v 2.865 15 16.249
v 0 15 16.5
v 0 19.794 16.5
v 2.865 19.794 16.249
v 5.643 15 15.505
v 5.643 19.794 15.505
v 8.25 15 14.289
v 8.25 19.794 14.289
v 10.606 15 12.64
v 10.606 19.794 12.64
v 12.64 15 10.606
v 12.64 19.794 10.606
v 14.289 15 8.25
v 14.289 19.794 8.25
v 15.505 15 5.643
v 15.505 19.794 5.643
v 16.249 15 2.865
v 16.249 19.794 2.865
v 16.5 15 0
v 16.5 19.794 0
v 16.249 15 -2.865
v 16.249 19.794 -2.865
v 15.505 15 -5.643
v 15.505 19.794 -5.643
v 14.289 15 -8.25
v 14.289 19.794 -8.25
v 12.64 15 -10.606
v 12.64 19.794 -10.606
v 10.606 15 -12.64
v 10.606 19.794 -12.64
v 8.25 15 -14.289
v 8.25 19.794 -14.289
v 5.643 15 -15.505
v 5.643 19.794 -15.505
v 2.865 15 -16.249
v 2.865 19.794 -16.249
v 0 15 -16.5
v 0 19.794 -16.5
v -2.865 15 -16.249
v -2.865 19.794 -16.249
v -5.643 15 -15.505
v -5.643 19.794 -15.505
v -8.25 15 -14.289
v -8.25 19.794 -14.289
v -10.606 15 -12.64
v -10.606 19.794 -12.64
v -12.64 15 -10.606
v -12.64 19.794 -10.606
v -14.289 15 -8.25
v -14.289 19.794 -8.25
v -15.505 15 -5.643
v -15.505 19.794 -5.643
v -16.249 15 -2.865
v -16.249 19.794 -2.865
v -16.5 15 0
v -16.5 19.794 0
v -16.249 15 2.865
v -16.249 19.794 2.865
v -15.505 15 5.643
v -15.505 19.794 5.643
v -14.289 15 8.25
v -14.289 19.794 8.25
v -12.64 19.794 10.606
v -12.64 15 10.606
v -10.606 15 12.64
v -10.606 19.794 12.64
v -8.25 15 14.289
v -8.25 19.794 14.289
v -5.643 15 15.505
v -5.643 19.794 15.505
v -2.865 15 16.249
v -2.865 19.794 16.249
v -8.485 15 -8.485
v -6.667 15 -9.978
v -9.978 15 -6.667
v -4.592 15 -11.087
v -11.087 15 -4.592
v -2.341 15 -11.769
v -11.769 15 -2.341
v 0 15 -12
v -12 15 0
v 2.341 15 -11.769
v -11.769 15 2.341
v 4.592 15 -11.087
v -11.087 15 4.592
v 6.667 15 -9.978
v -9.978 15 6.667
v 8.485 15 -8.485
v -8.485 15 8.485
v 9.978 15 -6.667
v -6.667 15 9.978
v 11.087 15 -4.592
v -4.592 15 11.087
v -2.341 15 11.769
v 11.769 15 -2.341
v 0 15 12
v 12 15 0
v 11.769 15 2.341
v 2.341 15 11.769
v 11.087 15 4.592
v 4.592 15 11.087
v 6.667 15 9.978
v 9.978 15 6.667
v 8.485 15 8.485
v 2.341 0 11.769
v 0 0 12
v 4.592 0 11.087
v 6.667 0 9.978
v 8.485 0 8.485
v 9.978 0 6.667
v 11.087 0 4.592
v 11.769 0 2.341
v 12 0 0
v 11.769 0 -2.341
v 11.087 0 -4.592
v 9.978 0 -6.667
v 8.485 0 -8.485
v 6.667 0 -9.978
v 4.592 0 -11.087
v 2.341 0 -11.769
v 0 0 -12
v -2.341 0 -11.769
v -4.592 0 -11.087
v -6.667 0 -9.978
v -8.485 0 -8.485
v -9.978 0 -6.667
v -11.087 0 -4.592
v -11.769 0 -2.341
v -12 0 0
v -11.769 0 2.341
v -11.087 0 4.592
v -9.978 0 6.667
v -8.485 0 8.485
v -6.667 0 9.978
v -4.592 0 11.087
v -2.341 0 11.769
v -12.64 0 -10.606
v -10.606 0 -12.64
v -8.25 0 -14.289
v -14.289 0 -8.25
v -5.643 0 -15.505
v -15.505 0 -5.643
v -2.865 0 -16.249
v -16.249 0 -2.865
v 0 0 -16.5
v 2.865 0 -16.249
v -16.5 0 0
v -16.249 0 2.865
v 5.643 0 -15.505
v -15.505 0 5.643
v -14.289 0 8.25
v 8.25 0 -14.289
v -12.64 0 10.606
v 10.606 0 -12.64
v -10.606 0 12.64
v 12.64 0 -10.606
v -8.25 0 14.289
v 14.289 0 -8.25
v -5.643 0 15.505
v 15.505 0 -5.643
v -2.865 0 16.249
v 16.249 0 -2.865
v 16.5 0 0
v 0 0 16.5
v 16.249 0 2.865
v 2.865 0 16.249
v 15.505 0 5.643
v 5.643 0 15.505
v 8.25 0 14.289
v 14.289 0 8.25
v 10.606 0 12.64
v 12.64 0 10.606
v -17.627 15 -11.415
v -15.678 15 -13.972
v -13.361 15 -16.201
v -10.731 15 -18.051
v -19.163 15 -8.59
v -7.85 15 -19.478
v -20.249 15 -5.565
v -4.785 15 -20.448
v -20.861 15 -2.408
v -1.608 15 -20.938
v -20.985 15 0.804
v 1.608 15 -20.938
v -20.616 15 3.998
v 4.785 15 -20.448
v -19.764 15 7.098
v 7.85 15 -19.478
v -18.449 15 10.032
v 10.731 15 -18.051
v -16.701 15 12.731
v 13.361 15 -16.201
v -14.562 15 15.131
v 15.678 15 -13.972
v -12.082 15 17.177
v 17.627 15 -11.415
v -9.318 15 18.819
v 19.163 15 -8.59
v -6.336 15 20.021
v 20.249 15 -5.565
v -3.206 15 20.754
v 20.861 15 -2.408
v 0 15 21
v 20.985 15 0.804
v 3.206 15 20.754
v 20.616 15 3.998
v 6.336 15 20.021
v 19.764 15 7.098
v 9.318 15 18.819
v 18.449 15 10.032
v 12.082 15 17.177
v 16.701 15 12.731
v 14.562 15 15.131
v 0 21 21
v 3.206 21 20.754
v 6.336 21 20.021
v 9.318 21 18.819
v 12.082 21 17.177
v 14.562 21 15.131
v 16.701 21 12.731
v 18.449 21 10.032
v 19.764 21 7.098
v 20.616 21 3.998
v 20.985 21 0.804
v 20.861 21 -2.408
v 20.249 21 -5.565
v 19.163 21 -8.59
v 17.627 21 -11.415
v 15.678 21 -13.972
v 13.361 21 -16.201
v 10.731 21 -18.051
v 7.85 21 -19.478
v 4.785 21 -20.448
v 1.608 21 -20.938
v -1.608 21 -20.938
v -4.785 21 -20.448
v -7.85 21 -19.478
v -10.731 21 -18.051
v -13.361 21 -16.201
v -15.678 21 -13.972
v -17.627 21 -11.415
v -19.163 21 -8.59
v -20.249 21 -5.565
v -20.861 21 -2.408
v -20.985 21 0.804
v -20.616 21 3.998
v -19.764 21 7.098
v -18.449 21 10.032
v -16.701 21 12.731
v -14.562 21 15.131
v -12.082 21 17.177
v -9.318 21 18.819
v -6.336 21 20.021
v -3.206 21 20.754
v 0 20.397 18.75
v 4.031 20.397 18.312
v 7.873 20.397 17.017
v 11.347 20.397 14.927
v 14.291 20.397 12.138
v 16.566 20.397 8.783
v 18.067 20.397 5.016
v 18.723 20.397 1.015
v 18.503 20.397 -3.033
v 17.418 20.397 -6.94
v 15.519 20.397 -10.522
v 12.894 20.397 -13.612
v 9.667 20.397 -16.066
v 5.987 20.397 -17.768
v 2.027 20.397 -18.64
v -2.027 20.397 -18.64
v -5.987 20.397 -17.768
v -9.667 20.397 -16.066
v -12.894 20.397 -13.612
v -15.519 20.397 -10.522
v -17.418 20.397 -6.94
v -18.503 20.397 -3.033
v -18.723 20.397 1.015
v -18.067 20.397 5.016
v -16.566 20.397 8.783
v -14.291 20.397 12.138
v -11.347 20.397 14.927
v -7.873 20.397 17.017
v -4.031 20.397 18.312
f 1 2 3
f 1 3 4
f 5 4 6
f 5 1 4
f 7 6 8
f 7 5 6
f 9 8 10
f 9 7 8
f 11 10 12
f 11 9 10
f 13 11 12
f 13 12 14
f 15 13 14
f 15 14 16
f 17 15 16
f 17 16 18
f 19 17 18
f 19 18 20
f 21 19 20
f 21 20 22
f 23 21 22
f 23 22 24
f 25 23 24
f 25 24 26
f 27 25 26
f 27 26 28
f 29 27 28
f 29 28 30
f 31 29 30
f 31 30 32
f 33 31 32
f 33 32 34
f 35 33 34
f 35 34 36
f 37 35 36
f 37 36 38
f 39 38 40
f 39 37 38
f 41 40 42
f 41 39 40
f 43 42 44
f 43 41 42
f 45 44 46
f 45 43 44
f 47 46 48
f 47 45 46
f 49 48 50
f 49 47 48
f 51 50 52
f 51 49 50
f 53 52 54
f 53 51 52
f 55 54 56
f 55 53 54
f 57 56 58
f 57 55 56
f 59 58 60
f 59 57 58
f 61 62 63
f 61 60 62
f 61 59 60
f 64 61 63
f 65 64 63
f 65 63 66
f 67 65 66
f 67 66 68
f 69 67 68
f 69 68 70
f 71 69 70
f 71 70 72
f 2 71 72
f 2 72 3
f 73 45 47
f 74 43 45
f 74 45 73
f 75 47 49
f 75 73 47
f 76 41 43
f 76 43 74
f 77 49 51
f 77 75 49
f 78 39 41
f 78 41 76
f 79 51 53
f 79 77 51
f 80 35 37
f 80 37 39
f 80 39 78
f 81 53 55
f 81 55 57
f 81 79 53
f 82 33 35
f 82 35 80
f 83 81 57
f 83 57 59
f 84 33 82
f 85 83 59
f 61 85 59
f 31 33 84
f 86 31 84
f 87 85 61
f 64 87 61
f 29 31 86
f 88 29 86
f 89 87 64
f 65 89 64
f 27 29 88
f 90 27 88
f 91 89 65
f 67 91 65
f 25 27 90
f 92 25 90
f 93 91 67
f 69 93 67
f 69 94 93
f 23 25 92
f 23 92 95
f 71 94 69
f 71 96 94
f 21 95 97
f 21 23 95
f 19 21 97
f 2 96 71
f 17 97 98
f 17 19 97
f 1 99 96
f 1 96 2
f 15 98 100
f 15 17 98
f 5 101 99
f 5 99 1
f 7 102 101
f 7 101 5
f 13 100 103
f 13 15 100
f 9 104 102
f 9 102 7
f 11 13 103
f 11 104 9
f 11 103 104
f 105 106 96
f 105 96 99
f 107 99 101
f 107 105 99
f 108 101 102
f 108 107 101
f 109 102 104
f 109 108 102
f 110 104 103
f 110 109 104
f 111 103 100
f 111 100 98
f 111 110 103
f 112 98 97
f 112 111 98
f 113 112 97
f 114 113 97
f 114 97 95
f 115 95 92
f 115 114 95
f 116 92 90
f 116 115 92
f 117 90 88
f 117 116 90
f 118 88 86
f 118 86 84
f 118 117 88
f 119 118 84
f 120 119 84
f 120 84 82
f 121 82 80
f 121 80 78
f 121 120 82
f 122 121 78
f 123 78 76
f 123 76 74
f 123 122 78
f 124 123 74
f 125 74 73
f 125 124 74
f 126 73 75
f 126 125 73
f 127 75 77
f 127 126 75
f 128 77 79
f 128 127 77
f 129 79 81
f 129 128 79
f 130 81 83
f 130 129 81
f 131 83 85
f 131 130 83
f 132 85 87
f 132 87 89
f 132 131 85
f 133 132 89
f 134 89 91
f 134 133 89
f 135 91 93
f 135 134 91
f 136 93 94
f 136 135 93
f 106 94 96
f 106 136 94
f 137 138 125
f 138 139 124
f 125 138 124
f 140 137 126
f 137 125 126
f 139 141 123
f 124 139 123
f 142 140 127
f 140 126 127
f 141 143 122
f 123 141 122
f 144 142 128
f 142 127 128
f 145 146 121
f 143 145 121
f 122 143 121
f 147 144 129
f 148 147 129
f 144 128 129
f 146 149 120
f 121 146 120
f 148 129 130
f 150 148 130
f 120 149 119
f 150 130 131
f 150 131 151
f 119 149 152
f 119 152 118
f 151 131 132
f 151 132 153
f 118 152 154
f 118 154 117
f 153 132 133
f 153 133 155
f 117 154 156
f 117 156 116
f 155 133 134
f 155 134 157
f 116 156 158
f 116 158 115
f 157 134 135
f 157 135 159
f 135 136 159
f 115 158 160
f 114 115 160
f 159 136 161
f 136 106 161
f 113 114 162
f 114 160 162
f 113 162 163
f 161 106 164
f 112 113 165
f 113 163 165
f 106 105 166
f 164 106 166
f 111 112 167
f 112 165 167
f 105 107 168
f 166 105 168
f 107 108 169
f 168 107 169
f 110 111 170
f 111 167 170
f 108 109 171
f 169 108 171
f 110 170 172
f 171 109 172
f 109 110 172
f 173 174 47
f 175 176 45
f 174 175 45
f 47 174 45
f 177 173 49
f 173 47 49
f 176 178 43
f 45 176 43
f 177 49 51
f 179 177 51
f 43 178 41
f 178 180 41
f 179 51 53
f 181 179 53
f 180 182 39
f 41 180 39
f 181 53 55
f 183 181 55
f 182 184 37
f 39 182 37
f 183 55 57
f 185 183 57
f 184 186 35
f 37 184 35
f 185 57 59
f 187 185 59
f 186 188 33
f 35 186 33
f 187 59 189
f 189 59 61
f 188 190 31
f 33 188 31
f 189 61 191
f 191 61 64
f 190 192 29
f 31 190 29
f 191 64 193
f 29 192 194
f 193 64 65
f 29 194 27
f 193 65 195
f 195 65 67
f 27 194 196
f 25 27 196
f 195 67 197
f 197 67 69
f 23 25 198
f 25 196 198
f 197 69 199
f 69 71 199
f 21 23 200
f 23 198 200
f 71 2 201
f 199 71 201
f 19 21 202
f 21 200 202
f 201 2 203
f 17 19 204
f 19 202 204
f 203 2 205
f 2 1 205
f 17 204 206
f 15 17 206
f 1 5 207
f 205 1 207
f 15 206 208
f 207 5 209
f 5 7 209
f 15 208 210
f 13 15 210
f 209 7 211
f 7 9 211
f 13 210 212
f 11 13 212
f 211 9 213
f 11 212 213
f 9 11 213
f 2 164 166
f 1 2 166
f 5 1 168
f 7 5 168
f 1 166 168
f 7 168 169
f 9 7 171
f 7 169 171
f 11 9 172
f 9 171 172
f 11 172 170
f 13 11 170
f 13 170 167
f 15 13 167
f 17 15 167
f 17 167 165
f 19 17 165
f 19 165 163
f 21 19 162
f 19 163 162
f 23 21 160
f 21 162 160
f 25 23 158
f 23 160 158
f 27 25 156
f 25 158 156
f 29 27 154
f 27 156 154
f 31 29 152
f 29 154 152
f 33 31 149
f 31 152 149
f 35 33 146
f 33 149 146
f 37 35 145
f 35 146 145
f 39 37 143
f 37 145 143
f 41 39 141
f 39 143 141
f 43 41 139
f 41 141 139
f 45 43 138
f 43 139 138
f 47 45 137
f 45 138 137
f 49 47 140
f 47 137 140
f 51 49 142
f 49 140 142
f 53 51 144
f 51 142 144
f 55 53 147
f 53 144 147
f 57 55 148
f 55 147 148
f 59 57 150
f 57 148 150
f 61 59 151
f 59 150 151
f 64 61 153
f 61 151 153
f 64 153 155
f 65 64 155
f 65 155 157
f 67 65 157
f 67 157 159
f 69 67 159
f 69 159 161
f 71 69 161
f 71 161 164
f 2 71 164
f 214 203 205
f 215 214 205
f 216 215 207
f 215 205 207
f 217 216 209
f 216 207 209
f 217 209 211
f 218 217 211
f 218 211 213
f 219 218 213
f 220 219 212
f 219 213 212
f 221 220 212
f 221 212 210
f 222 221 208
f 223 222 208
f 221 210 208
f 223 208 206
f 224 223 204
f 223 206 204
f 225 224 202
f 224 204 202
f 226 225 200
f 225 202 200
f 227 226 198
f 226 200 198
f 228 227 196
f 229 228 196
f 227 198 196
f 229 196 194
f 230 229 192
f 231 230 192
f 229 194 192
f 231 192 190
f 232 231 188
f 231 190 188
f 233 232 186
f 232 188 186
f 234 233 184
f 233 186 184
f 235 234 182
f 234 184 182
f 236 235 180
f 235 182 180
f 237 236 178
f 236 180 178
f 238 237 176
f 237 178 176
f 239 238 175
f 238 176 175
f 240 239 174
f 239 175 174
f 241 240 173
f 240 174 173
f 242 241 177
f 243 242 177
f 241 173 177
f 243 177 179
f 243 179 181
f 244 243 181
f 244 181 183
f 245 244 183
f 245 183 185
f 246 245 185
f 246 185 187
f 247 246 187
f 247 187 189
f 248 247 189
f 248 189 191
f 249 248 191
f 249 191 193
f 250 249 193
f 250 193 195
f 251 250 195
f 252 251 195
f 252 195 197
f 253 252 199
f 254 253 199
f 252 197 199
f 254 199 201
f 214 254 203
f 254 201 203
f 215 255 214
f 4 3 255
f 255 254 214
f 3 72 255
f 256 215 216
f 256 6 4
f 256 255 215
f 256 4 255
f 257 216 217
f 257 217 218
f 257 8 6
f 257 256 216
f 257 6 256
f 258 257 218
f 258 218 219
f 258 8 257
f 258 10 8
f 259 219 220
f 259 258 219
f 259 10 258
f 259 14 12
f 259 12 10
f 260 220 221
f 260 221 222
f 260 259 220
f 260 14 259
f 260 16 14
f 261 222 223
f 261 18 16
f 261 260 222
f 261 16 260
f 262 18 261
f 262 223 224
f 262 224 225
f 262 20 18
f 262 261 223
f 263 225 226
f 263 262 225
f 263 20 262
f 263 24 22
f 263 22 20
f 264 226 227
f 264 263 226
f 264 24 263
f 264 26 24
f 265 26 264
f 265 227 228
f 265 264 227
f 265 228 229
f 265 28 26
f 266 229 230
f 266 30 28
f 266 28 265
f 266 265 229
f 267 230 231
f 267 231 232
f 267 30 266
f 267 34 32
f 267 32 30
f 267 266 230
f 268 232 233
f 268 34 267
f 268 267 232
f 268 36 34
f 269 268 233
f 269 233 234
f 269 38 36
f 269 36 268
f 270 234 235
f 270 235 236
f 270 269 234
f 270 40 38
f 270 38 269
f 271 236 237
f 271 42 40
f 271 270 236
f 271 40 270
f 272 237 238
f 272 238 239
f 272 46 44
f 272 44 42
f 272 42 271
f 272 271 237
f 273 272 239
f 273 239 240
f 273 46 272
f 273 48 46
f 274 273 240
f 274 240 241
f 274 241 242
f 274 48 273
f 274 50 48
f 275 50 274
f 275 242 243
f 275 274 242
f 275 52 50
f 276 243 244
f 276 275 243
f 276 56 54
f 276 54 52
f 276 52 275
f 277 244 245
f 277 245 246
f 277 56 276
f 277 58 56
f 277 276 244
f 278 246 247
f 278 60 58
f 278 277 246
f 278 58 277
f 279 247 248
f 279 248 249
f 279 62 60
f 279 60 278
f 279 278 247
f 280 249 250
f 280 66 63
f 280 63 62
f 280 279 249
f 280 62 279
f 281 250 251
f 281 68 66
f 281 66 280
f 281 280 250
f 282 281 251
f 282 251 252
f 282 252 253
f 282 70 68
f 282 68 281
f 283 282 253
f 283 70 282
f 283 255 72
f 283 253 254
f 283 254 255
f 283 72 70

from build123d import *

# Parameters (mm, degrees)
SKETCH1_R           = 16.5
SKETCH1_R_2         = 12
BOSS_EXTRUDE1_DEPTH = 15
SKETCH2_R           = 21
SKETCH2_R_2         = 16.5
BOSS_EXTRUDE2_DEPTH = 6


with BuildPart() as part:
    # Sketch1 → Boss-Extrude1 (new body)
    with BuildSketch(Plane(origin=(0, 0, 0), x_dir=(1, 0, 0), z_dir=(0, 1, 0))):
        with Locations(Location((0, 0, 0), (0, 0, 270))):
            Circle(SKETCH1_R)
        with Locations(Location((0, 0, 0), (0, 0, 270))):
            Circle(SKETCH1_R_2, mode=Mode.SUBTRACT)
    extrude(amount=BOSS_EXTRUDE1_DEPTH)


with BuildPart() as body_2:
    # Sketch2 → Boss-Extrude2 (new body)
    with BuildSketch(Plane(origin=(0, 15, 0), x_dir=(1, 0, 0), z_dir=(0, 1, 0))):
        with Locations(Location((0, 0, 0), (0, 0, 270))):
            Circle(SKETCH2_R)
        with Locations(Location((0, 0, 0), (0, 0, 270))):
            Circle(SKETCH2_R_2, mode=Mode.SUBTRACT)
    extrude(amount=BOSS_EXTRUDE2_DEPTH)

    # Sketch3 → Cut-Revolve1 (revolve, cut)
    with BuildSketch(Plane.XY, mode=Mode.PRIVATE) as cut_revolve1_sk:
        Polygon((0, 21), (-21, 21), (0, 15.373066959), align=None)
    revolve(cut_revolve1_sk.sketch.rotate(Axis((0, 0, 0), (0, 1, 0)), 90), axis=Axis((0, 0, 0), (0, 1, 0)), mode=Mode.SUBTRACT)


solid = Compound([part.part, body_2.part])
